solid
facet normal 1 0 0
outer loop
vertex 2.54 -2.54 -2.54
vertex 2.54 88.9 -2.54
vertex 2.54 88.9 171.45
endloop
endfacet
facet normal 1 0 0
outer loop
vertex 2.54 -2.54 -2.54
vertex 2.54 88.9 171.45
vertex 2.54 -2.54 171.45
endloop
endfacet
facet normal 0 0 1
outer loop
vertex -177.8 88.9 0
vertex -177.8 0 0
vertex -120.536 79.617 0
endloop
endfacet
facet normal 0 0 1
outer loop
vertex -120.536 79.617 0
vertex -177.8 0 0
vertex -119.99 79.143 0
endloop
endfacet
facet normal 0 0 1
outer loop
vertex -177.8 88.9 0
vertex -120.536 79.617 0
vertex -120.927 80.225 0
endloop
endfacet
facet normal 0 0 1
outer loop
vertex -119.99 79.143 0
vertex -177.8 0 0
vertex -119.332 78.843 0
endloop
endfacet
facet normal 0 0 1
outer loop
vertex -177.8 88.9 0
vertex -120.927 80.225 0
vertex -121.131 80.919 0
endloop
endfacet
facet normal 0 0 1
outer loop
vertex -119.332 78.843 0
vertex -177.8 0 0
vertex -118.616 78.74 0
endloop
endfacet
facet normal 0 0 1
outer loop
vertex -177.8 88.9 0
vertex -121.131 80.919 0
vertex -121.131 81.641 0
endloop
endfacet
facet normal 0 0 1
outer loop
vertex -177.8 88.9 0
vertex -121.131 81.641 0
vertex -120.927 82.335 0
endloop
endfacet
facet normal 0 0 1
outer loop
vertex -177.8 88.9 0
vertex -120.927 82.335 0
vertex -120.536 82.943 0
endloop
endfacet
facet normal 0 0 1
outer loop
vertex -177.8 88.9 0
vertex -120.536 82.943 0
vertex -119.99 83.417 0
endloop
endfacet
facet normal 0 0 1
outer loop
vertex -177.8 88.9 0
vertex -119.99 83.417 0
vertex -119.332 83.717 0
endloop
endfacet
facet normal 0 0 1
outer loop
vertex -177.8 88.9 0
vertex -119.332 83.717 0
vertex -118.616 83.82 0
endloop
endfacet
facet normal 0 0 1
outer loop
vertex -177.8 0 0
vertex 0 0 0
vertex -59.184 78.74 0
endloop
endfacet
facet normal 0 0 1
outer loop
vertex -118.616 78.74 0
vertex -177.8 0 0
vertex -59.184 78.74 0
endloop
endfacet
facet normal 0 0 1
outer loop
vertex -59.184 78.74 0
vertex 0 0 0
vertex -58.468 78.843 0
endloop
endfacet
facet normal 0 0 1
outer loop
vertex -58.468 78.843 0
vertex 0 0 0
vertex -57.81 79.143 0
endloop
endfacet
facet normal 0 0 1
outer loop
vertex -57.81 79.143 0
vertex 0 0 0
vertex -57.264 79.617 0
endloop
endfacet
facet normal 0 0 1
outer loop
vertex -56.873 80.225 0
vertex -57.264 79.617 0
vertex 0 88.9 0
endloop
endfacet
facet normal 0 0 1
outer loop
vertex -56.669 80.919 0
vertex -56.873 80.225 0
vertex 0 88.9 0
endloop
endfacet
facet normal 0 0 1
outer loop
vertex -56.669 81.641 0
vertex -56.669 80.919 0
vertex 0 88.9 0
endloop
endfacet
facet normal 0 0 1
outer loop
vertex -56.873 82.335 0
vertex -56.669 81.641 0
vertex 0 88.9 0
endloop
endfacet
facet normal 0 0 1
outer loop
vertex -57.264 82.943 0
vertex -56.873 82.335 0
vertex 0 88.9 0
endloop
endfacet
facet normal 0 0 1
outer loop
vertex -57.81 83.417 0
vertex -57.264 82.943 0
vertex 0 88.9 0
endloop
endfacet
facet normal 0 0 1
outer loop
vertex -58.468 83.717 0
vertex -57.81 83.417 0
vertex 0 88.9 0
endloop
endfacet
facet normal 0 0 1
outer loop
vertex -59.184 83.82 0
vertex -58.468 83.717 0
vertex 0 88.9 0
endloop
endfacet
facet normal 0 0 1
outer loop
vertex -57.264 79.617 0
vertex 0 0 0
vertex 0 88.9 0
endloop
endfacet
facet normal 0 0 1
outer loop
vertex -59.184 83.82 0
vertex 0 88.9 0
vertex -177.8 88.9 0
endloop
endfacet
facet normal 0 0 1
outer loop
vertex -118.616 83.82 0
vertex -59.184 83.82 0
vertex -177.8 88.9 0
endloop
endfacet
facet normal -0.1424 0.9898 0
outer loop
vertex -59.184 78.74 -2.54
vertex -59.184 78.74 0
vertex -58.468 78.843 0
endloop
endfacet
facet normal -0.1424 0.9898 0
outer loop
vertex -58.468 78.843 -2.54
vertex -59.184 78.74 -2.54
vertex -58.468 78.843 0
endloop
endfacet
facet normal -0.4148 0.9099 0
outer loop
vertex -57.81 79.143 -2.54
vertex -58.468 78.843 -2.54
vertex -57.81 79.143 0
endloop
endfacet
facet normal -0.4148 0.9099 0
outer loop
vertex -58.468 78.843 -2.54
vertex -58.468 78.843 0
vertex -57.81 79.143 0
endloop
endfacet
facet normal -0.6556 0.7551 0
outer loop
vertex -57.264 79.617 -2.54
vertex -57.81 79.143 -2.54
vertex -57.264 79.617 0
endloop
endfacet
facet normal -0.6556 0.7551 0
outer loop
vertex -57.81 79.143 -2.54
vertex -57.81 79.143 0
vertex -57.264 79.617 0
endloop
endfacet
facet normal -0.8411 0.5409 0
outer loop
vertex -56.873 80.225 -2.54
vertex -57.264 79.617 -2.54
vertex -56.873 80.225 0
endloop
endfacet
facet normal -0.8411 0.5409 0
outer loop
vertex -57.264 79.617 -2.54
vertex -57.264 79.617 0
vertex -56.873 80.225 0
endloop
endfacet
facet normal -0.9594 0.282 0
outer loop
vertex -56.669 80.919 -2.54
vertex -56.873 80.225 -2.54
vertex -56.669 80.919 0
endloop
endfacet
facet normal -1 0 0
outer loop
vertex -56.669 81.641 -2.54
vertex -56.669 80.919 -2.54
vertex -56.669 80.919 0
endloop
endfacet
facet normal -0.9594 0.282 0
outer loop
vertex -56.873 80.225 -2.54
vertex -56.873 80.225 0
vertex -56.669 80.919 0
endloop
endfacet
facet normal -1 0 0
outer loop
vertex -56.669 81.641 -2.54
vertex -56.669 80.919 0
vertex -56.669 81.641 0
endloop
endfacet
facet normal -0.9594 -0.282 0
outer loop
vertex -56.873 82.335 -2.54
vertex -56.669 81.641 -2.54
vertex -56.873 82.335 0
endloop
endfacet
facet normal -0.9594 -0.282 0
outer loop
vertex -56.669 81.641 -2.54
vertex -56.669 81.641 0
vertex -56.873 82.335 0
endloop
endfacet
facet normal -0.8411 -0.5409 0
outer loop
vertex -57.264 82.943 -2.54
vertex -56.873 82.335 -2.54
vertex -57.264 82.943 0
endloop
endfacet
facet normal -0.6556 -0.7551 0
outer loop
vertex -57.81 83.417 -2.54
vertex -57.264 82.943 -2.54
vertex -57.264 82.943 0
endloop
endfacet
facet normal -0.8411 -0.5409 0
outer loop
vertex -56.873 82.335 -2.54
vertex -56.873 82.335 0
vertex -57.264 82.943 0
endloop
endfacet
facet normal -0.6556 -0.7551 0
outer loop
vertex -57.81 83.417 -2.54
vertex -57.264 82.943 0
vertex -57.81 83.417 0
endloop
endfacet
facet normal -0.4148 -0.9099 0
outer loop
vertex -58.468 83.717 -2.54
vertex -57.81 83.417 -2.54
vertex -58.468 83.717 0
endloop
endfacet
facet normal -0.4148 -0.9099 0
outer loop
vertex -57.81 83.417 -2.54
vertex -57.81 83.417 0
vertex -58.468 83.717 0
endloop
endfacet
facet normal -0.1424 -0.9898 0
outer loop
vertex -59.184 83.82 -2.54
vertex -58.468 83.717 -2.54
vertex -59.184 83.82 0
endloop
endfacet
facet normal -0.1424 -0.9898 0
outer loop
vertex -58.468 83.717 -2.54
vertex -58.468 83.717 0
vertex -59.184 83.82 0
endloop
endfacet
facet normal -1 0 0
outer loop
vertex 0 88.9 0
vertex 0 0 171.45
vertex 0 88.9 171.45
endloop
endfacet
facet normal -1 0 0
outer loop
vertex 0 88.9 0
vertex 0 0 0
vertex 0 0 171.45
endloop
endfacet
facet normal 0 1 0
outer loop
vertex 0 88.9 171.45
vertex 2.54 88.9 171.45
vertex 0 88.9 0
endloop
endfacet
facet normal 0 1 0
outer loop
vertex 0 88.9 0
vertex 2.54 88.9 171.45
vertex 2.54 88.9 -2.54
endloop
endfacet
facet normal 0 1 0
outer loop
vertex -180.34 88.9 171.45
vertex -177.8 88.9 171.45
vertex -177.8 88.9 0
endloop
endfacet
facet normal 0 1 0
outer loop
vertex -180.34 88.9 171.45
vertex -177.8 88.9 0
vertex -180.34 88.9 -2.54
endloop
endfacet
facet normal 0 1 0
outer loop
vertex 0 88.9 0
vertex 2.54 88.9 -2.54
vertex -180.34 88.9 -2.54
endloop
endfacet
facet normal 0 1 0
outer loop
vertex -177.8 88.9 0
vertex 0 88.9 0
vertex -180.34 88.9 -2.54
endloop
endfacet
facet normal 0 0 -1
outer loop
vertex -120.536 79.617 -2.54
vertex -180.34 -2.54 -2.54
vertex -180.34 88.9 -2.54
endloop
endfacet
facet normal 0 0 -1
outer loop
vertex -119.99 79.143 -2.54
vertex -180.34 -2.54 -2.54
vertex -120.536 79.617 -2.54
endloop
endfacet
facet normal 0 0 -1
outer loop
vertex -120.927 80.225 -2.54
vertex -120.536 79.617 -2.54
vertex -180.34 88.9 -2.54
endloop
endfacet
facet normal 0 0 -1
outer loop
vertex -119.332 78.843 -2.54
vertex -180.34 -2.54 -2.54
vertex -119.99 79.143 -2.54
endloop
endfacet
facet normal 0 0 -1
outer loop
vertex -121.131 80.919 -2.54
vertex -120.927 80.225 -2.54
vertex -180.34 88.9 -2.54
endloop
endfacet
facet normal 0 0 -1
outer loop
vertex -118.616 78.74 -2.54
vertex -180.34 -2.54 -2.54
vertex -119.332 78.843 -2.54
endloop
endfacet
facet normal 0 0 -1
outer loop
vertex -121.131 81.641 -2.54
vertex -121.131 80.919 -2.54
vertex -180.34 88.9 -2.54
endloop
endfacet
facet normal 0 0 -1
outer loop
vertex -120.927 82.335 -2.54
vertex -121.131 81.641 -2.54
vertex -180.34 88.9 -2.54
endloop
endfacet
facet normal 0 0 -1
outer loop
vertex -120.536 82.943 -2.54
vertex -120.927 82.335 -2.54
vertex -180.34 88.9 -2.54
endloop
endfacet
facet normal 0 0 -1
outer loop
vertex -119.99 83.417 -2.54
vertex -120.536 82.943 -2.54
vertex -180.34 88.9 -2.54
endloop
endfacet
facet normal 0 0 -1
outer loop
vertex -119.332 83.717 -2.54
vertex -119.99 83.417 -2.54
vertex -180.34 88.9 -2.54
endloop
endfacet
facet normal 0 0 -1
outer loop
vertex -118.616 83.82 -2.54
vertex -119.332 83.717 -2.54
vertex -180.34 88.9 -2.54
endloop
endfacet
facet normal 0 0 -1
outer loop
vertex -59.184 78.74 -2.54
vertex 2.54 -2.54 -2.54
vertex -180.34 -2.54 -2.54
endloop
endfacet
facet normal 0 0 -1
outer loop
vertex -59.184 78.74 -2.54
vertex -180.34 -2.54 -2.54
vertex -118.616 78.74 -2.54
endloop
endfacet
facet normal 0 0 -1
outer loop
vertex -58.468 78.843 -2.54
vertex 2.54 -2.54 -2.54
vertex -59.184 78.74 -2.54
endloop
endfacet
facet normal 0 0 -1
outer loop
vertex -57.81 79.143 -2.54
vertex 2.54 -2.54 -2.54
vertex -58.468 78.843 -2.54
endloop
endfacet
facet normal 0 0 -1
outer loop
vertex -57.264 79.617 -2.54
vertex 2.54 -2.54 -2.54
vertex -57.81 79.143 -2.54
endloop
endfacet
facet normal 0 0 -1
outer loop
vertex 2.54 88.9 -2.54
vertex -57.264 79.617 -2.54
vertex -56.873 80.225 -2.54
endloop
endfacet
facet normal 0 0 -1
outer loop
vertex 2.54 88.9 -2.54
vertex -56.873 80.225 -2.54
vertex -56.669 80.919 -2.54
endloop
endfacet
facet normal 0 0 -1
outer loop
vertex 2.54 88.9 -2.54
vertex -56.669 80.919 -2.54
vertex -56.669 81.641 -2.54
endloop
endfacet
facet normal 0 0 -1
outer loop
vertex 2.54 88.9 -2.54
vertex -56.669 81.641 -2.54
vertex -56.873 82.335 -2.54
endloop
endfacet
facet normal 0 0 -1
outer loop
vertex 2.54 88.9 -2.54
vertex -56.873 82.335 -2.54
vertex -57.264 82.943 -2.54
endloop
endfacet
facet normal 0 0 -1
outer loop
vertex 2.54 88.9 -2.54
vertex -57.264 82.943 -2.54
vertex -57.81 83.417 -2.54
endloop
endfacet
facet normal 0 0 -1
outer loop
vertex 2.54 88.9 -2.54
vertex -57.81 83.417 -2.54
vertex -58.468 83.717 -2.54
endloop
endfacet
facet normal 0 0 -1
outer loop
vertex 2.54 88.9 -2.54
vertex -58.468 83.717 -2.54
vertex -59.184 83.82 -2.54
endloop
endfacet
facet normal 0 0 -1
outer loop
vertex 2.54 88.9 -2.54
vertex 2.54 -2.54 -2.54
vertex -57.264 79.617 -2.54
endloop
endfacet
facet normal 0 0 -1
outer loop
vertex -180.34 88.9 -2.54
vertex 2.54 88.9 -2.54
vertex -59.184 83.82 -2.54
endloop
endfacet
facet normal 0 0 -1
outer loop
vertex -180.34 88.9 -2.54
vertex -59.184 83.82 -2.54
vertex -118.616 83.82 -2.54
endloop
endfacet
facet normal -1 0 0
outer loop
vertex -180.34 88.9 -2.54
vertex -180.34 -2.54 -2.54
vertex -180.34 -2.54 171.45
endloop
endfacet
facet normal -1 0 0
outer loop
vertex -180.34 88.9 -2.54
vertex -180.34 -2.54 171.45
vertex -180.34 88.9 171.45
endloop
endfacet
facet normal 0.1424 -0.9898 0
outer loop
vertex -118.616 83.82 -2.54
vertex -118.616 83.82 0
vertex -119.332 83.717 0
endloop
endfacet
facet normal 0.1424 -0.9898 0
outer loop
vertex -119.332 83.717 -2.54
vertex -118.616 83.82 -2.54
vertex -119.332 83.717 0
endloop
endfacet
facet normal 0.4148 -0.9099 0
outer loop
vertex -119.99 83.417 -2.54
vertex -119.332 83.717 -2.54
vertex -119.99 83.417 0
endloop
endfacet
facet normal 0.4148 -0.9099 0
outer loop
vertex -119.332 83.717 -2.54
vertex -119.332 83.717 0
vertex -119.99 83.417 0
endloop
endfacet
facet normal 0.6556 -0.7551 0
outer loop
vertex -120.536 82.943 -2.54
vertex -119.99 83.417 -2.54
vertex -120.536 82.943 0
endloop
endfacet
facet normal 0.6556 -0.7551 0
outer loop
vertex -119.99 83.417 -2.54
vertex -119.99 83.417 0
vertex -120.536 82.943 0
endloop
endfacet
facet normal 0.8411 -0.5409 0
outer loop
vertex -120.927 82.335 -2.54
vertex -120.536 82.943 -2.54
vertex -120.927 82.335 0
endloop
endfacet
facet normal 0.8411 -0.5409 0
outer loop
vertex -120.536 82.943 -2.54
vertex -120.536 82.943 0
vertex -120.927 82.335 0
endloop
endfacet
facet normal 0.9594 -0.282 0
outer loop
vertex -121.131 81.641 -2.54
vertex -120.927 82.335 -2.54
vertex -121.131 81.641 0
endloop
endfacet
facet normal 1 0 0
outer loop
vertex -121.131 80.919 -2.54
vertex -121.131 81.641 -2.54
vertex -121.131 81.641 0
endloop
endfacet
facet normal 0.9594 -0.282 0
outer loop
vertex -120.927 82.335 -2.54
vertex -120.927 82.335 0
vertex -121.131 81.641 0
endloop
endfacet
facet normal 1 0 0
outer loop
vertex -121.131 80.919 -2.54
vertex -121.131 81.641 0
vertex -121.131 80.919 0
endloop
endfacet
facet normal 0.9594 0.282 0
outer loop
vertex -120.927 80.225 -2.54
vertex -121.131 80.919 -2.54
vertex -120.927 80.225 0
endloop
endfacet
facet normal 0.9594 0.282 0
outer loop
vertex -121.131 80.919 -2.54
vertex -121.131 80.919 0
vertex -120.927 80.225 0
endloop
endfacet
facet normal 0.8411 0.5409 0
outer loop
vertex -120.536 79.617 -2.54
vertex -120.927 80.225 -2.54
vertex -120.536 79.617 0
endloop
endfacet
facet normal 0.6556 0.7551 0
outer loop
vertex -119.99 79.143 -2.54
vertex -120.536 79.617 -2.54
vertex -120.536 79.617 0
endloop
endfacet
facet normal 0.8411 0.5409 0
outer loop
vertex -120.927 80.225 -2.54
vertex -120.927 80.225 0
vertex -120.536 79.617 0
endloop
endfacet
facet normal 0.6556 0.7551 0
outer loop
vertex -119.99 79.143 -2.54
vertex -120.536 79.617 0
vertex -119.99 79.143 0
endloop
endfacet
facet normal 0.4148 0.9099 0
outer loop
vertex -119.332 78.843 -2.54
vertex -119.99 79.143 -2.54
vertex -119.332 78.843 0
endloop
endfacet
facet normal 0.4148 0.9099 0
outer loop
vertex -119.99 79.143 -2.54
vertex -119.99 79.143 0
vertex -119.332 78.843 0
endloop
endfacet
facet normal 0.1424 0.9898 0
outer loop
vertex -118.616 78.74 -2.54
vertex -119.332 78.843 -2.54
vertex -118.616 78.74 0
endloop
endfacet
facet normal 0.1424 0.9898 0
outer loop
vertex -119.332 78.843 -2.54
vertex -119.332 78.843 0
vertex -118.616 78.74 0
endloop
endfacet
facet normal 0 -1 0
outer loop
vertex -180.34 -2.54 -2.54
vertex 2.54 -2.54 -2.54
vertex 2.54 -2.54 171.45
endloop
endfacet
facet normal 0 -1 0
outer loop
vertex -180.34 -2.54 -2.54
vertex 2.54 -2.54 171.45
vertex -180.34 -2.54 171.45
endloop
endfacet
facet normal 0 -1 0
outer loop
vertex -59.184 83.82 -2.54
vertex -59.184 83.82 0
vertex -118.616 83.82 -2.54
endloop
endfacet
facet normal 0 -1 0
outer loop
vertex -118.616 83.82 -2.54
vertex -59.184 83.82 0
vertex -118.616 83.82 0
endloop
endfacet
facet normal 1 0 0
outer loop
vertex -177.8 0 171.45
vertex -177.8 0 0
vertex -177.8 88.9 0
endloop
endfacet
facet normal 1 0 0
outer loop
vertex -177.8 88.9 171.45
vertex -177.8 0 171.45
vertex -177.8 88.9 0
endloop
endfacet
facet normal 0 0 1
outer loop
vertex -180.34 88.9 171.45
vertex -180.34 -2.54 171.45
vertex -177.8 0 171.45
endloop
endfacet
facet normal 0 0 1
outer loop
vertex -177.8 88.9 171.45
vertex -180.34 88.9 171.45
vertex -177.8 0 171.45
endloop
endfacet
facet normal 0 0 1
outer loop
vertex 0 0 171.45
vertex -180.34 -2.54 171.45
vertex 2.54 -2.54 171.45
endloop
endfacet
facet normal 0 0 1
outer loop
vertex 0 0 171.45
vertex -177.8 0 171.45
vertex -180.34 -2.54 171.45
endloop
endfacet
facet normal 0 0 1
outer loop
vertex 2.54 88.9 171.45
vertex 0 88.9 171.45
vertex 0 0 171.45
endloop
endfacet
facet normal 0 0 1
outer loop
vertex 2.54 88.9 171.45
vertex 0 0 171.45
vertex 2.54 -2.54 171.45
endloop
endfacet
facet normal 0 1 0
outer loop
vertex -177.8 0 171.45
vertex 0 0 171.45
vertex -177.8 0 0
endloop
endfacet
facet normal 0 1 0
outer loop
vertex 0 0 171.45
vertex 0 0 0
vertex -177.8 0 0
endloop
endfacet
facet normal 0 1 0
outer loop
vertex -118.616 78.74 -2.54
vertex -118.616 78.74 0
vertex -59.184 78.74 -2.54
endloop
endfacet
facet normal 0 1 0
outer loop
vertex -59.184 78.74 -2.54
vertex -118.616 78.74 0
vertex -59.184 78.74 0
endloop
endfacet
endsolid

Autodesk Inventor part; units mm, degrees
ref_plane "YZ Plane" through (0, 0, 0) normal (1, 0, 0) x (0, 1, 0)
ref_plane "XZ Plane" through (0, 0, 0) normal (0, 1, 0) x (-1, 0, 0)
ref_plane "XY Plane" through (0, 0, 0) normal (0, 0, 1) x (1, 0, 0)
sketch "Sketch1" plane through (0, 0, 0) normal (0, 0, 1) x (1, 0, 0)
  line L0 (0, 0) -> (-177.8, 0)
  line L1 (-177.8, 0) -> (-177.8, 88.9)
  line L2 (0, 0) -> (0, 88.9)
  line L3 (2.54, 88.9) -> (2.54, -2.54)
  line L4 (2.54, -2.54) -> (-180.34, -2.54)
  line L5 (-180.34, -2.54) -> (-180.34, 88.9)
  line L6 (-180.34, 88.9) -> (-177.8, 88.9)
  line L7 (2.54, 88.9) -> (0, 88.9)
  dimension "d0" = 177.8
  dimension "d2" = 2.54
  dimension "d13" = 88.9
extrude "Extrusion1" add sketch "Sketch1" along normal blind 171.45
sketch "Sketch2" plane through (2.54, -2.54, 0) normal (1, 0, 0) x (0, 0, -1)
  line L0 (0, 0) -> (0, 91.44) projected
  line L1 (0, 0) -> (2.54, 0)
  line L2 (2.54, 0) -> (2.54, 91.44)
  line L3 (2.54, 91.44) -> (0, 91.44)
  line L4 (0, 91.44) -> (0, 0)
  point P0 (0, 2.54)
  point P1 (1.27, 91.44)
  dimension "d5" = 2.54
extrude "Extrusion2" add sketch "Sketch2" against normal up to surface (182.88 mm away)
sketch "Sketch3" plane through (-177.8, 0, 0) normal (0, 0, 1) x (1, 0, 0)
  line L0 (56.6436, 81.28) -> (121.1564, 81.28) construction
  line L1 (59.1836, 78.74) -> (118.6164, 78.74)
  line L2 (118.6164, 83.82) -> (59.1836, 83.82)
  arc A0 (59.1836, 83.82) -> (59.1836, 78.74) centre (59.1836, 81.28) ccw
  arc A1 (118.6164, 78.74) -> (118.6164, 83.82) centre (118.6164, 81.28) ccw
  line L3 (177.8, 88.9) -> (0, 88.9) projected
  line L4 (177.8, 0) -> (0, 0) projected
  point P0 (88.9, 81.28)
  point P1 (88.9, 83.82)
  point P2 (88.9, 88.9)
  dimension "d9" = 5.08
  dimension "d10" = 81.28
extrude "Extrusion3" cut sketch "Sketch3" against normal through all
properties part number "batteryholder-ver1-1111-2017"
